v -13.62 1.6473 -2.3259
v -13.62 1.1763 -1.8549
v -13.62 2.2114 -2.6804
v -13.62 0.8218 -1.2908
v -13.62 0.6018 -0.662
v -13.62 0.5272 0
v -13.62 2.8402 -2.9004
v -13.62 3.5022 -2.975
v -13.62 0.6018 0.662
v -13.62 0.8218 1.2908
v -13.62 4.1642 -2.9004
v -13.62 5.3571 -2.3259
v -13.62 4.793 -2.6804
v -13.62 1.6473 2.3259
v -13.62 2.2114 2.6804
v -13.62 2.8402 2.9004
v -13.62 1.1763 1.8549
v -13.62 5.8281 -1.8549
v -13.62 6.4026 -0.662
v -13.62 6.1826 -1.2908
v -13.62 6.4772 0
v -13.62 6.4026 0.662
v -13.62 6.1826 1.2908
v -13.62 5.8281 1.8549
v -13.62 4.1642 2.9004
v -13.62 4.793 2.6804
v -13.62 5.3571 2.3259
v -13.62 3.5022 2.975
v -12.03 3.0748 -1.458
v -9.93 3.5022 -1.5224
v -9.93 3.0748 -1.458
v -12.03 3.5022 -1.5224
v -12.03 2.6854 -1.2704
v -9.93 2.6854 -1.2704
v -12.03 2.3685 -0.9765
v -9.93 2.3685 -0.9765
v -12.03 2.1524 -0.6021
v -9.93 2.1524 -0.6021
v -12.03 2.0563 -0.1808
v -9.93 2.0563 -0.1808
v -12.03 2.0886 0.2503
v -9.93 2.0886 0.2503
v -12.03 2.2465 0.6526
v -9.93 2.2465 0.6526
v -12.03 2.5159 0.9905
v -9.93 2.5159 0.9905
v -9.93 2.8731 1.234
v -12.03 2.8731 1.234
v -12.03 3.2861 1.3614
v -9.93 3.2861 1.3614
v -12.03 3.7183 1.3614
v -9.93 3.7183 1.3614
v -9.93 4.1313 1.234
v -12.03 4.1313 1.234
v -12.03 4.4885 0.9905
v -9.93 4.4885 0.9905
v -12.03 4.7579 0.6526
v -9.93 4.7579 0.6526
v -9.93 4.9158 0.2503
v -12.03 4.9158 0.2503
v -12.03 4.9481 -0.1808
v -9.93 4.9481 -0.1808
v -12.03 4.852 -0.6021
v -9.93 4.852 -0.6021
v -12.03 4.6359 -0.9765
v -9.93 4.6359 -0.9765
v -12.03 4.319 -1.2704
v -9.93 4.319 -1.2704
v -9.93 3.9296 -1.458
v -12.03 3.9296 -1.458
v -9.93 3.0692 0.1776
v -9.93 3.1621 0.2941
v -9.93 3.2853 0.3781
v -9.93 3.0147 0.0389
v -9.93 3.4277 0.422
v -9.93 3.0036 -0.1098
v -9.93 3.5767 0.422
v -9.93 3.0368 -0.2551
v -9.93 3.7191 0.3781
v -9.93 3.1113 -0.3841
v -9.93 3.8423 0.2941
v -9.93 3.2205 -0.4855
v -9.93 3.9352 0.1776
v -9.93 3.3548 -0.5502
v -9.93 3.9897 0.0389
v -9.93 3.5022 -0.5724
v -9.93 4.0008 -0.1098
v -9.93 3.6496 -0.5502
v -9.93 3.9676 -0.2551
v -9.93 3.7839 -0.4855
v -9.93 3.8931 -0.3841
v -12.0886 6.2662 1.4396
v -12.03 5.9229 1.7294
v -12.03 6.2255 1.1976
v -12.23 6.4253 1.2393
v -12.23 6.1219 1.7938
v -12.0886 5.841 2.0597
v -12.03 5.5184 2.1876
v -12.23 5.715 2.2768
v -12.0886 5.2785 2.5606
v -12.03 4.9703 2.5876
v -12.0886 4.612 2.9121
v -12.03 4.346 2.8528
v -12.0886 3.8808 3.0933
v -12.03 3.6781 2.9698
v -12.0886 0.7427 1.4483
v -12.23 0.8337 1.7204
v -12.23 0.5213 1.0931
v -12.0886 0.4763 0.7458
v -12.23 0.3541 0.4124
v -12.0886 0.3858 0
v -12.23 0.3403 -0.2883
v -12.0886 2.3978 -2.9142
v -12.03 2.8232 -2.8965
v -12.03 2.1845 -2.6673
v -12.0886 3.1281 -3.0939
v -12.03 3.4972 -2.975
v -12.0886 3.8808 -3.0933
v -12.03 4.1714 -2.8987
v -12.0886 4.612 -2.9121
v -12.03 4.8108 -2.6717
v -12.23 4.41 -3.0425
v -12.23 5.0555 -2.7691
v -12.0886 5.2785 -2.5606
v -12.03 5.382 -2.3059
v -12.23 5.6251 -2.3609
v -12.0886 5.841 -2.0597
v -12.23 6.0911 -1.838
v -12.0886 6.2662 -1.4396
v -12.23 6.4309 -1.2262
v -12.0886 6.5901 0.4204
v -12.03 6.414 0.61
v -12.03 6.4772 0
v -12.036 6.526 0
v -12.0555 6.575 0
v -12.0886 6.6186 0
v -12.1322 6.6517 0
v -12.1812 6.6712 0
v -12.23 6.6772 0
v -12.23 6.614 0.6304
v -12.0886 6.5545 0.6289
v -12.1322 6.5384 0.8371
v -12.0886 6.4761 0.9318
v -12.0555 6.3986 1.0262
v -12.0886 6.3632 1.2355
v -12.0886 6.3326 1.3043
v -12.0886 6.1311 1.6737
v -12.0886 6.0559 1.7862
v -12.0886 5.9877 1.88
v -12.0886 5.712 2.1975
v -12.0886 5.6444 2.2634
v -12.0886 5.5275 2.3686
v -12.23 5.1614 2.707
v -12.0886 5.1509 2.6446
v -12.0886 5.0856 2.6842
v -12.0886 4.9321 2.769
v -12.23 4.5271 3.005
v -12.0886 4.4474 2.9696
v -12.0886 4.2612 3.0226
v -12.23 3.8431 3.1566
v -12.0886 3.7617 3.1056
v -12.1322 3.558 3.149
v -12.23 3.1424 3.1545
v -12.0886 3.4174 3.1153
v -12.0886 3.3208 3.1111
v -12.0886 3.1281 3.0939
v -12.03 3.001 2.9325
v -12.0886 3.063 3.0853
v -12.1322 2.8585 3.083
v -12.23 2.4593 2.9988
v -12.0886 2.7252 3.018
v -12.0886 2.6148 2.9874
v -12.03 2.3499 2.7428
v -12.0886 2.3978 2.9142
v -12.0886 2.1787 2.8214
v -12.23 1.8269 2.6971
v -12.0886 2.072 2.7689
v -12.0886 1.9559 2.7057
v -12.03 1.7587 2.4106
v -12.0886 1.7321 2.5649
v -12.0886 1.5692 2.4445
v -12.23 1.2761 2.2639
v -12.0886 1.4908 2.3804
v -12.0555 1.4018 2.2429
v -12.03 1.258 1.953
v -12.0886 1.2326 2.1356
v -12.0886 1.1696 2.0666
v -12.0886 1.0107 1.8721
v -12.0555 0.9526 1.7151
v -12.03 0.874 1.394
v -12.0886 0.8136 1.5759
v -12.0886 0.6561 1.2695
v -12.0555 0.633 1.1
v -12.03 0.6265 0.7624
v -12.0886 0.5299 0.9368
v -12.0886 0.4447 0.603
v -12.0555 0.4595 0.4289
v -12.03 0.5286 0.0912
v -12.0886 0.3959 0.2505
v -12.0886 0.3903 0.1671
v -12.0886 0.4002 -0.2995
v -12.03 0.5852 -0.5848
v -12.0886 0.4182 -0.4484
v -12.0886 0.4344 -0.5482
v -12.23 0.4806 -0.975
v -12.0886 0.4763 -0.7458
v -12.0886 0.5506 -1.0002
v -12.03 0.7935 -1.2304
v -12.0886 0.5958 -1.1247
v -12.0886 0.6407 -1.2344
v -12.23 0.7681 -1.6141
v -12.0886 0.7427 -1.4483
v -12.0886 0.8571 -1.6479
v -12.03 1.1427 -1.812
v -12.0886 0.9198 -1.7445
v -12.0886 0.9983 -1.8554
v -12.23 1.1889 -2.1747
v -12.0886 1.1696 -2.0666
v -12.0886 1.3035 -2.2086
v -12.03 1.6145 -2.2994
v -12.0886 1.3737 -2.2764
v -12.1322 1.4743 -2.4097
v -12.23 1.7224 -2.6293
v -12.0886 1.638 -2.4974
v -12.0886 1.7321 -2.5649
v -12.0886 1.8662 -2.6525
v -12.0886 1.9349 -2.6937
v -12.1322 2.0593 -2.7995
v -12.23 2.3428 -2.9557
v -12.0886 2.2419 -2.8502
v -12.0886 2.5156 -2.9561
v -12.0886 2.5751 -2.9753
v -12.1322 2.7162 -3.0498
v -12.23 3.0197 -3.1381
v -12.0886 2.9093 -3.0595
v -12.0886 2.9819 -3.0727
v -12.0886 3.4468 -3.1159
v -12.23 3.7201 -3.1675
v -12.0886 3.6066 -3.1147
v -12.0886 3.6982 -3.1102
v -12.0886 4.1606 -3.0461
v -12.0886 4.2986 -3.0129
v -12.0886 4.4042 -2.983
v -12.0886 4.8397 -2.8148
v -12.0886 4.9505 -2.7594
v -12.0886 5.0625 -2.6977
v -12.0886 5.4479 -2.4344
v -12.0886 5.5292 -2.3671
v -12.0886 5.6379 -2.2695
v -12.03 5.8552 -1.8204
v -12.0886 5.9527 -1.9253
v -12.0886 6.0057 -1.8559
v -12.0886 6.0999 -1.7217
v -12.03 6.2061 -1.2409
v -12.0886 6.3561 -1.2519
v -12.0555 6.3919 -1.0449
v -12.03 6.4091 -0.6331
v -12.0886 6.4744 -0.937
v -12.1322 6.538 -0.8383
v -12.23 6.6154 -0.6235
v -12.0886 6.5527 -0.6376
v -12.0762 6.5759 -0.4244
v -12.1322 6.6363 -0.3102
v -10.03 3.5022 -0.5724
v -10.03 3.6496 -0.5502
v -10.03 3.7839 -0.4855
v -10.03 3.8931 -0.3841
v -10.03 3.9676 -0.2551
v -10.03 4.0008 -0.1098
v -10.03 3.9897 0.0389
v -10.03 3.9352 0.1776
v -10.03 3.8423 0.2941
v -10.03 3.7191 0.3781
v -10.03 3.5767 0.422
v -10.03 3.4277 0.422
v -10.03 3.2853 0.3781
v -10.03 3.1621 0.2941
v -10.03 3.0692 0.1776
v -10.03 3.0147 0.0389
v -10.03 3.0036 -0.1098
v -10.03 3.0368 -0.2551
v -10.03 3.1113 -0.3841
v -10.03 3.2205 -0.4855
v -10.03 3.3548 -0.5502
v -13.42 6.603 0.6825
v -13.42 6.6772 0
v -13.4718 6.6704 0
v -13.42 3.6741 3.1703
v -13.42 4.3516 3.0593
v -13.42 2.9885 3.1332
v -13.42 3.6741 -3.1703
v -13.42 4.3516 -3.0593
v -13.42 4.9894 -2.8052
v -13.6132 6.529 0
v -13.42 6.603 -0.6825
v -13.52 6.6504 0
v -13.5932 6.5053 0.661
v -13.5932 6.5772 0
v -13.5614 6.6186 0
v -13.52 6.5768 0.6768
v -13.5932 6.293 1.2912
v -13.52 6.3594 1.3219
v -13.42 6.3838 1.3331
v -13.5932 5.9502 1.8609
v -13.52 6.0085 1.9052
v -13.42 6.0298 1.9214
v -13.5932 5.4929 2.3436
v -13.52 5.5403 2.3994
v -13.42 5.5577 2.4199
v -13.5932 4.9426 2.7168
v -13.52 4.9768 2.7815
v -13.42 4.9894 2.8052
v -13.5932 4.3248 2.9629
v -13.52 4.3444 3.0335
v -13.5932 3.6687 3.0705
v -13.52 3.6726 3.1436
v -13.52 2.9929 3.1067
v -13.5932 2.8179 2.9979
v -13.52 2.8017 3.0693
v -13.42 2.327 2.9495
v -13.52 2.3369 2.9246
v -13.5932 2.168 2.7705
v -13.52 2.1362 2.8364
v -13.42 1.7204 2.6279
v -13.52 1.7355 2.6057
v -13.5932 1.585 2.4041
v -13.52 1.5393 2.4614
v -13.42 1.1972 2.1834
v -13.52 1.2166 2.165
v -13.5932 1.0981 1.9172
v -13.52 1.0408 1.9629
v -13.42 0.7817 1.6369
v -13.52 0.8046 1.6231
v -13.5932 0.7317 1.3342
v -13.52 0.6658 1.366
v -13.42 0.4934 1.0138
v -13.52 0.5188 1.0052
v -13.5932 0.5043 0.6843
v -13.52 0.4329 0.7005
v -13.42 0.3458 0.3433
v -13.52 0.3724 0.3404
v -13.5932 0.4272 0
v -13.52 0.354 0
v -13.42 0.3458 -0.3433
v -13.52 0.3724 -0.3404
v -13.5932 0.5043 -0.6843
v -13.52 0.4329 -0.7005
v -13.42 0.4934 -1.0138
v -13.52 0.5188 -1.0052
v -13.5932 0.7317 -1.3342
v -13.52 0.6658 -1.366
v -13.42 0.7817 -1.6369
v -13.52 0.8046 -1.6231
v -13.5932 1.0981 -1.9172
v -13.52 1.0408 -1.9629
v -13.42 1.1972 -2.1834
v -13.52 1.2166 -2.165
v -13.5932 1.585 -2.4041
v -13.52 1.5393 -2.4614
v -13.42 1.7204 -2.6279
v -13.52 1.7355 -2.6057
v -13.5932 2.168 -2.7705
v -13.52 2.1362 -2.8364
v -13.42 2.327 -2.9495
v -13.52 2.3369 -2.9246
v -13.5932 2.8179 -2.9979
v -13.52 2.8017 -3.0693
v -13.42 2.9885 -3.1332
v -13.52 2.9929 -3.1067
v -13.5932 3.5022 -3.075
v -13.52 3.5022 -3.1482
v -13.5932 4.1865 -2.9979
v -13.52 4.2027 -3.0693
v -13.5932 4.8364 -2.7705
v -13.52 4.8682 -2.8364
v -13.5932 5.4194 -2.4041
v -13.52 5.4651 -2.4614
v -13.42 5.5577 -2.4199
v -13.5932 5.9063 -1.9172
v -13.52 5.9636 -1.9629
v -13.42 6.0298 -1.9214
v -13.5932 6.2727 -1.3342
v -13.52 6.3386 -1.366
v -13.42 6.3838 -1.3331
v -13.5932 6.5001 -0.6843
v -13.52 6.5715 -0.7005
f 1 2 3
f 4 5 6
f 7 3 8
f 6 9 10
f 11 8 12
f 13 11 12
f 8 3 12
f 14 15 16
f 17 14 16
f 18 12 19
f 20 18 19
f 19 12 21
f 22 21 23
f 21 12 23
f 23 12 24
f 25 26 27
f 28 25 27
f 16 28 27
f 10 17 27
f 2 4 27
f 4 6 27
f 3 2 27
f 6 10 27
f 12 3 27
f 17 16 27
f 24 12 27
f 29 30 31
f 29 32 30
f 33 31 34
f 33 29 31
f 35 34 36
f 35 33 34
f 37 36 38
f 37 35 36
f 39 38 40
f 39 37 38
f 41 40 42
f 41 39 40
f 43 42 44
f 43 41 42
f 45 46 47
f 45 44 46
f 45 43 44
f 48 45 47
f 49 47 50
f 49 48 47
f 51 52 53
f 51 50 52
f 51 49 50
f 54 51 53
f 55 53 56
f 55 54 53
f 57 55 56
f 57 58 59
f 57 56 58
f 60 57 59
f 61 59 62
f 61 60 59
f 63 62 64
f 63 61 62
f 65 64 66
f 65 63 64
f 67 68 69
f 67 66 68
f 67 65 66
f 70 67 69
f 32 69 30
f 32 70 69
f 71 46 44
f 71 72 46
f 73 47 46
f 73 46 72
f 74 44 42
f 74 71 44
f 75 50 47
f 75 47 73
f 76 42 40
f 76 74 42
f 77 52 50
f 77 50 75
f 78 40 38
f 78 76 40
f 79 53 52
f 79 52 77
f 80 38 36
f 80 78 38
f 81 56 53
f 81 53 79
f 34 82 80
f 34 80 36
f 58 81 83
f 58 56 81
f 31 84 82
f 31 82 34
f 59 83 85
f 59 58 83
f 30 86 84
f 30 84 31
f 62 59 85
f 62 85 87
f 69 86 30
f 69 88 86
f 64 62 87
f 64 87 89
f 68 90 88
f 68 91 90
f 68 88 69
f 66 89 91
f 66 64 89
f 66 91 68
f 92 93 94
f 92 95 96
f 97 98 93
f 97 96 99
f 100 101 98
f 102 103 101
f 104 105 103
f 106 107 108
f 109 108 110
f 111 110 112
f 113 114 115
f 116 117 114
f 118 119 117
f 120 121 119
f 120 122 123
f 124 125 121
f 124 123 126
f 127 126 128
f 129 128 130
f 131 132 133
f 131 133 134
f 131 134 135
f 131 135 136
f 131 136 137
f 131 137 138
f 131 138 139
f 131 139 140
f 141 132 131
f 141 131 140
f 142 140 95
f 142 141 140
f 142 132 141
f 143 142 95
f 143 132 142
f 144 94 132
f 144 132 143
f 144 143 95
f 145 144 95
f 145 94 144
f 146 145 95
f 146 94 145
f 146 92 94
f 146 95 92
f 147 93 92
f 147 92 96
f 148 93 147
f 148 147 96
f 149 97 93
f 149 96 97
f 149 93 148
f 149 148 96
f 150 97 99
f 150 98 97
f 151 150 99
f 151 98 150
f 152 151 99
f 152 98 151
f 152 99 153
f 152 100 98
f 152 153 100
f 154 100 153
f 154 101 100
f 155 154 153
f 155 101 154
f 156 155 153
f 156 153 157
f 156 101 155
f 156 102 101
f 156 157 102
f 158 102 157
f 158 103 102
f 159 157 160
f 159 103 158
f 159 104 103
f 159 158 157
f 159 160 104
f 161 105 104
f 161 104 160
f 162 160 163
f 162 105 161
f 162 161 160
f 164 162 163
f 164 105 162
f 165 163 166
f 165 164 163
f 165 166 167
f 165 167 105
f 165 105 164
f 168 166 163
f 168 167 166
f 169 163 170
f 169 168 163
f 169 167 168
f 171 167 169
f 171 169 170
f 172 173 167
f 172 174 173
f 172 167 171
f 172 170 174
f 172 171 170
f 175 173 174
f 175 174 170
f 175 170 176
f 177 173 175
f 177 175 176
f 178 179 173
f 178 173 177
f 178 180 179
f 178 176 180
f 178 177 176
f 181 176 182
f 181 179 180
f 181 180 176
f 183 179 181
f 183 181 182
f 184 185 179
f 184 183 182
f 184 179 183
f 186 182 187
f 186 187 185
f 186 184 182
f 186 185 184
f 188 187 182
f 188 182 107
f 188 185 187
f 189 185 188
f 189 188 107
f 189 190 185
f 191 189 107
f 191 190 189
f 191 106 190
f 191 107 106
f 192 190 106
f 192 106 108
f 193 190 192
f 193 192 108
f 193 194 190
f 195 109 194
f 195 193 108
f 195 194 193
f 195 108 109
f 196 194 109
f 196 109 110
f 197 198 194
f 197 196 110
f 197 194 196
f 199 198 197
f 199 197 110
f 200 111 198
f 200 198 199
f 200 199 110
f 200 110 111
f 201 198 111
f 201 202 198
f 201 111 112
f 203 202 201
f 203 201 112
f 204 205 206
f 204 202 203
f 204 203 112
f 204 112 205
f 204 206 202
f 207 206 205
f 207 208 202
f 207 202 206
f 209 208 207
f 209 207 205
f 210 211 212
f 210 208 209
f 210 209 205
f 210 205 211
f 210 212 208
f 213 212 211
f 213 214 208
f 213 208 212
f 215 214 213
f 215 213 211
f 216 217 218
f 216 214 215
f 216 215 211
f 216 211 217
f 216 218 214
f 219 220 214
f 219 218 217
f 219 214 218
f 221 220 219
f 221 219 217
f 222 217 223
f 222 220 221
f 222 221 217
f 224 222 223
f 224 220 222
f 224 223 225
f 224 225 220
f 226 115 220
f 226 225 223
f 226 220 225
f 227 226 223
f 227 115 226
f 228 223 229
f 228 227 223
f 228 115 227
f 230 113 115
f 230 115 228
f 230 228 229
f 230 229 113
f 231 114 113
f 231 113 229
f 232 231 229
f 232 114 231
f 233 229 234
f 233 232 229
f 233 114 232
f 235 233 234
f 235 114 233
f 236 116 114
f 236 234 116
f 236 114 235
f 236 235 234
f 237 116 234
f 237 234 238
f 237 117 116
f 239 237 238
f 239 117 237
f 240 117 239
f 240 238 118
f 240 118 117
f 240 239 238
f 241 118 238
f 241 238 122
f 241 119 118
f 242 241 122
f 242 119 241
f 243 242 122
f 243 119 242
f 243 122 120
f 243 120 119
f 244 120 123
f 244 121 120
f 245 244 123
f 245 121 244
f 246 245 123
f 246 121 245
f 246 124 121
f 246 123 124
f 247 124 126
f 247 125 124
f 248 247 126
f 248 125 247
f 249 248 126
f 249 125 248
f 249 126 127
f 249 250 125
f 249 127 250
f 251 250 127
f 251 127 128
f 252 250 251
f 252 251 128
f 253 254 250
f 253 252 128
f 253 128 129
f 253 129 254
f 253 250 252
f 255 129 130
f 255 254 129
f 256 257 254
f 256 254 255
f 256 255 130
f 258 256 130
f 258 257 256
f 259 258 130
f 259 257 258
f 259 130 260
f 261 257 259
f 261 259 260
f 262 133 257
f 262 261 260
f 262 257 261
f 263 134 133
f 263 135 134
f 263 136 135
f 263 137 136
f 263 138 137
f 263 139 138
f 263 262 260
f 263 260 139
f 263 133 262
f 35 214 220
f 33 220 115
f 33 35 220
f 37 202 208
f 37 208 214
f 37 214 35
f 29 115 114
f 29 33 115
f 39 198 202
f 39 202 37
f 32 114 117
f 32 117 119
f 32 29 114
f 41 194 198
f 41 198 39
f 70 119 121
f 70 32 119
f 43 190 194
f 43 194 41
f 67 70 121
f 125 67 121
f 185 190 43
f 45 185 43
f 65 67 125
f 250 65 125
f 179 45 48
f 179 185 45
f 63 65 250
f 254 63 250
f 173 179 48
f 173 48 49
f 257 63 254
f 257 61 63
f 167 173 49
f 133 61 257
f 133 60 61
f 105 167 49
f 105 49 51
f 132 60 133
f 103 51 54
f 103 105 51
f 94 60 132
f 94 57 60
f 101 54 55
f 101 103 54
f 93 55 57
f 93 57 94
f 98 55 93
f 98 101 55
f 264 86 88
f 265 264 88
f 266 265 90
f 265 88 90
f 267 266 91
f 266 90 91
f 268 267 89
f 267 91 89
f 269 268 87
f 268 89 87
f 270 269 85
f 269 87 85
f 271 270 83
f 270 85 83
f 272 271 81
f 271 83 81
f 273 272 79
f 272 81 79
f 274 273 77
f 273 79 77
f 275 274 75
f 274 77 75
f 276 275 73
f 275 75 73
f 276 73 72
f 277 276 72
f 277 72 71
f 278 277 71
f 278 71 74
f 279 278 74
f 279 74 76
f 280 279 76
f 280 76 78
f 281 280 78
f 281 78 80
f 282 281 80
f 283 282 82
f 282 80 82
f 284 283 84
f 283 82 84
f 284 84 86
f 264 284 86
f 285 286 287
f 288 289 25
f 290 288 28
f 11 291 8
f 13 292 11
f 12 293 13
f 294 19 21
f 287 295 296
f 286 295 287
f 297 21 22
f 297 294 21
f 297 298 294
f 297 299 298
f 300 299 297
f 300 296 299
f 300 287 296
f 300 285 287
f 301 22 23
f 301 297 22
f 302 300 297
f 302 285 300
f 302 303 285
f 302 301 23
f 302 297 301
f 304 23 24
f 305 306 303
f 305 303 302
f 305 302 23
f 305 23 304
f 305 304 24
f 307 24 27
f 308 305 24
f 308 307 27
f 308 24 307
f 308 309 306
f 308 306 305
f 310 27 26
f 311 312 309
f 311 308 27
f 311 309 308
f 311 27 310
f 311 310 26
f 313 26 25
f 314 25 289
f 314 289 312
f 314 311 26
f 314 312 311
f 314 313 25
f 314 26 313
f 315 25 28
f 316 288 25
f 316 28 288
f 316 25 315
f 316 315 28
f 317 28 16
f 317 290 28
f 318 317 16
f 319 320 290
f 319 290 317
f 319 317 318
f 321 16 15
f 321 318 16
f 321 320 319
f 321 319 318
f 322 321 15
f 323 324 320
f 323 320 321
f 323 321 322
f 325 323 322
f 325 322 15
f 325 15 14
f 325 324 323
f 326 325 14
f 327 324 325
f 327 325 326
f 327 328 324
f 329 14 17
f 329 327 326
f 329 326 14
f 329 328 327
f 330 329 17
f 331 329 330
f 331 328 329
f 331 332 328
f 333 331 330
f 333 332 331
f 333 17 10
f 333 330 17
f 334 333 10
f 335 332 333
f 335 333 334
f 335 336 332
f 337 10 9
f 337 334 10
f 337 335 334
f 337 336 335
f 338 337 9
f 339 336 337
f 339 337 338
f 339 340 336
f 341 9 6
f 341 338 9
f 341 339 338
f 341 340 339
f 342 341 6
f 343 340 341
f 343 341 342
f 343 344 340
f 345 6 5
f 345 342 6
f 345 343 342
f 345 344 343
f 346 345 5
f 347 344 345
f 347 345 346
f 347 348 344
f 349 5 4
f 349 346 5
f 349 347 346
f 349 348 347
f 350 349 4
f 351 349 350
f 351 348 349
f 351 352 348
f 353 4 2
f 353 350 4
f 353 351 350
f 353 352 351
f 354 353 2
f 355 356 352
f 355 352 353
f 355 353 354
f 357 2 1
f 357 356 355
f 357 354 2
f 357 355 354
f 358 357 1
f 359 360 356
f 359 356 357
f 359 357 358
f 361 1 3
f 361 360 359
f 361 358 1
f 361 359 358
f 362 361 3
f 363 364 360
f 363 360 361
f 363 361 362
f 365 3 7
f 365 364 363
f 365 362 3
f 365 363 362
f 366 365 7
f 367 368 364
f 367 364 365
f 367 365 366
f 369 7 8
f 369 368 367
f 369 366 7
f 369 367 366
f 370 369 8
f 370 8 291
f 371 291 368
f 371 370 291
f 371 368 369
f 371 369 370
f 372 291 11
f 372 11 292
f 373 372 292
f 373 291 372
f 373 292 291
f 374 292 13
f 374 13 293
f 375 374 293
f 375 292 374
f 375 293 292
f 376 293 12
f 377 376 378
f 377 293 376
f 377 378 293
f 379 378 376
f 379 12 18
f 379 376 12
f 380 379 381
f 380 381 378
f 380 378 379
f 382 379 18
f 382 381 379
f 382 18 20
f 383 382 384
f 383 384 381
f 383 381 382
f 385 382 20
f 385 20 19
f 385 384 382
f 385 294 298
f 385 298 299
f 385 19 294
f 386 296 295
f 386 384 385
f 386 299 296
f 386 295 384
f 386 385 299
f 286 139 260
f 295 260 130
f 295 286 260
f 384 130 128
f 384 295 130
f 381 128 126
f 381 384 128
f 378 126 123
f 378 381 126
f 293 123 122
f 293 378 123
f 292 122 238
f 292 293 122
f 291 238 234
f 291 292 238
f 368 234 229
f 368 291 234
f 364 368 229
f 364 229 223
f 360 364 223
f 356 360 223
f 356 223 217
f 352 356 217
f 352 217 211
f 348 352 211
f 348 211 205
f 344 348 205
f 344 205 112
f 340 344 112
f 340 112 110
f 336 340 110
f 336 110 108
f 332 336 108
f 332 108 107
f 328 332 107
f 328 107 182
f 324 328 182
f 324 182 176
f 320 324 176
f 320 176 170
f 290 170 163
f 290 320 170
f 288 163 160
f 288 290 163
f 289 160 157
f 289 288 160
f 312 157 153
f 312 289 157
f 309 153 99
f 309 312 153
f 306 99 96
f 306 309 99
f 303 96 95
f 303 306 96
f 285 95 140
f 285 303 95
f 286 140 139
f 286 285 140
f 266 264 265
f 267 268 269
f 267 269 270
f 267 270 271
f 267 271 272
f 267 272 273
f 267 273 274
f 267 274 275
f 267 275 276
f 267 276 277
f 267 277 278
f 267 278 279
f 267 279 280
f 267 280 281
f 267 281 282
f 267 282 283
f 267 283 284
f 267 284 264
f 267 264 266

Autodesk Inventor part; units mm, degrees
ref_plane "YZ Plane" through (0, 0, 0) normal (1, 0, 0) x (0, 1, 0)
ref_plane "XZ Plane" through (0, 0, 0) normal (0, 1, 0) x (-1, 0, 0)
ref_plane "XY Plane" through (0, 0, 0) normal (0, 0, 1) x (1, 0, 0)
sketch "Sketch1" plane through (0, 0, 0) normal (0, 0, 1) x (1, 0, 0)
  point P0 (0, 0)
sketch "Sketch9" plane through (0, 0, 0) normal (0, 0, 1) x (1, 0, 0)
  line L0 (-12.03, 6.6772) -> (-12.03, 3.5022)
  line L1 (-13.62, 3.5022) -> (-13.62, 6.6772)
  line L2 (-12.05, 6.6772) -> (-13.62, 6.6772)
  line L3 (-13.62, 6.6772) -> (-12.03, 6.6772)
  line L4 (-13.62, 3.5022) -> (-12.03, 3.5022)
  point P0 (0, 0)
  dimension "d87" = 12.03
  dimension "d90" = 3.175
revolve "Revolution1" add sketch "Sketch9" angle 360 about axis through (-13.62, 3.5022, 0) along (1, 0, 0)
sketch "Sketch10" plane through (-12.03, 3.5022, 0) normal (1, 0, 0) x (0, 0, -1)
  circle A0 centre (0.0724, 0) radius 1.45
  point P0 (0, -3.5022)
fillet "Fillet11" radius 0.2 2 edges at (-12.03, 0.3272, 0) (-13.62, 0.3272, 0)
extrude "Extrusion7" add sketch "Sketch10" along normal blind 2.1
sketch "Sketch12" plane through (-9.93, 3.5022, -0.0724) normal (1, 0, 0) x (0, 0, -1)
  circle A0 centre (0, 0) radius 1.45 projected
  circle A1 centre (0, 0) radius 0.5
  point P0 (-0.0724, -3.5022)
extrude "Extrusion10" cut sketch "Sketch12" against normal blind 0.1 contours A1
properties part number "falsarueda"
